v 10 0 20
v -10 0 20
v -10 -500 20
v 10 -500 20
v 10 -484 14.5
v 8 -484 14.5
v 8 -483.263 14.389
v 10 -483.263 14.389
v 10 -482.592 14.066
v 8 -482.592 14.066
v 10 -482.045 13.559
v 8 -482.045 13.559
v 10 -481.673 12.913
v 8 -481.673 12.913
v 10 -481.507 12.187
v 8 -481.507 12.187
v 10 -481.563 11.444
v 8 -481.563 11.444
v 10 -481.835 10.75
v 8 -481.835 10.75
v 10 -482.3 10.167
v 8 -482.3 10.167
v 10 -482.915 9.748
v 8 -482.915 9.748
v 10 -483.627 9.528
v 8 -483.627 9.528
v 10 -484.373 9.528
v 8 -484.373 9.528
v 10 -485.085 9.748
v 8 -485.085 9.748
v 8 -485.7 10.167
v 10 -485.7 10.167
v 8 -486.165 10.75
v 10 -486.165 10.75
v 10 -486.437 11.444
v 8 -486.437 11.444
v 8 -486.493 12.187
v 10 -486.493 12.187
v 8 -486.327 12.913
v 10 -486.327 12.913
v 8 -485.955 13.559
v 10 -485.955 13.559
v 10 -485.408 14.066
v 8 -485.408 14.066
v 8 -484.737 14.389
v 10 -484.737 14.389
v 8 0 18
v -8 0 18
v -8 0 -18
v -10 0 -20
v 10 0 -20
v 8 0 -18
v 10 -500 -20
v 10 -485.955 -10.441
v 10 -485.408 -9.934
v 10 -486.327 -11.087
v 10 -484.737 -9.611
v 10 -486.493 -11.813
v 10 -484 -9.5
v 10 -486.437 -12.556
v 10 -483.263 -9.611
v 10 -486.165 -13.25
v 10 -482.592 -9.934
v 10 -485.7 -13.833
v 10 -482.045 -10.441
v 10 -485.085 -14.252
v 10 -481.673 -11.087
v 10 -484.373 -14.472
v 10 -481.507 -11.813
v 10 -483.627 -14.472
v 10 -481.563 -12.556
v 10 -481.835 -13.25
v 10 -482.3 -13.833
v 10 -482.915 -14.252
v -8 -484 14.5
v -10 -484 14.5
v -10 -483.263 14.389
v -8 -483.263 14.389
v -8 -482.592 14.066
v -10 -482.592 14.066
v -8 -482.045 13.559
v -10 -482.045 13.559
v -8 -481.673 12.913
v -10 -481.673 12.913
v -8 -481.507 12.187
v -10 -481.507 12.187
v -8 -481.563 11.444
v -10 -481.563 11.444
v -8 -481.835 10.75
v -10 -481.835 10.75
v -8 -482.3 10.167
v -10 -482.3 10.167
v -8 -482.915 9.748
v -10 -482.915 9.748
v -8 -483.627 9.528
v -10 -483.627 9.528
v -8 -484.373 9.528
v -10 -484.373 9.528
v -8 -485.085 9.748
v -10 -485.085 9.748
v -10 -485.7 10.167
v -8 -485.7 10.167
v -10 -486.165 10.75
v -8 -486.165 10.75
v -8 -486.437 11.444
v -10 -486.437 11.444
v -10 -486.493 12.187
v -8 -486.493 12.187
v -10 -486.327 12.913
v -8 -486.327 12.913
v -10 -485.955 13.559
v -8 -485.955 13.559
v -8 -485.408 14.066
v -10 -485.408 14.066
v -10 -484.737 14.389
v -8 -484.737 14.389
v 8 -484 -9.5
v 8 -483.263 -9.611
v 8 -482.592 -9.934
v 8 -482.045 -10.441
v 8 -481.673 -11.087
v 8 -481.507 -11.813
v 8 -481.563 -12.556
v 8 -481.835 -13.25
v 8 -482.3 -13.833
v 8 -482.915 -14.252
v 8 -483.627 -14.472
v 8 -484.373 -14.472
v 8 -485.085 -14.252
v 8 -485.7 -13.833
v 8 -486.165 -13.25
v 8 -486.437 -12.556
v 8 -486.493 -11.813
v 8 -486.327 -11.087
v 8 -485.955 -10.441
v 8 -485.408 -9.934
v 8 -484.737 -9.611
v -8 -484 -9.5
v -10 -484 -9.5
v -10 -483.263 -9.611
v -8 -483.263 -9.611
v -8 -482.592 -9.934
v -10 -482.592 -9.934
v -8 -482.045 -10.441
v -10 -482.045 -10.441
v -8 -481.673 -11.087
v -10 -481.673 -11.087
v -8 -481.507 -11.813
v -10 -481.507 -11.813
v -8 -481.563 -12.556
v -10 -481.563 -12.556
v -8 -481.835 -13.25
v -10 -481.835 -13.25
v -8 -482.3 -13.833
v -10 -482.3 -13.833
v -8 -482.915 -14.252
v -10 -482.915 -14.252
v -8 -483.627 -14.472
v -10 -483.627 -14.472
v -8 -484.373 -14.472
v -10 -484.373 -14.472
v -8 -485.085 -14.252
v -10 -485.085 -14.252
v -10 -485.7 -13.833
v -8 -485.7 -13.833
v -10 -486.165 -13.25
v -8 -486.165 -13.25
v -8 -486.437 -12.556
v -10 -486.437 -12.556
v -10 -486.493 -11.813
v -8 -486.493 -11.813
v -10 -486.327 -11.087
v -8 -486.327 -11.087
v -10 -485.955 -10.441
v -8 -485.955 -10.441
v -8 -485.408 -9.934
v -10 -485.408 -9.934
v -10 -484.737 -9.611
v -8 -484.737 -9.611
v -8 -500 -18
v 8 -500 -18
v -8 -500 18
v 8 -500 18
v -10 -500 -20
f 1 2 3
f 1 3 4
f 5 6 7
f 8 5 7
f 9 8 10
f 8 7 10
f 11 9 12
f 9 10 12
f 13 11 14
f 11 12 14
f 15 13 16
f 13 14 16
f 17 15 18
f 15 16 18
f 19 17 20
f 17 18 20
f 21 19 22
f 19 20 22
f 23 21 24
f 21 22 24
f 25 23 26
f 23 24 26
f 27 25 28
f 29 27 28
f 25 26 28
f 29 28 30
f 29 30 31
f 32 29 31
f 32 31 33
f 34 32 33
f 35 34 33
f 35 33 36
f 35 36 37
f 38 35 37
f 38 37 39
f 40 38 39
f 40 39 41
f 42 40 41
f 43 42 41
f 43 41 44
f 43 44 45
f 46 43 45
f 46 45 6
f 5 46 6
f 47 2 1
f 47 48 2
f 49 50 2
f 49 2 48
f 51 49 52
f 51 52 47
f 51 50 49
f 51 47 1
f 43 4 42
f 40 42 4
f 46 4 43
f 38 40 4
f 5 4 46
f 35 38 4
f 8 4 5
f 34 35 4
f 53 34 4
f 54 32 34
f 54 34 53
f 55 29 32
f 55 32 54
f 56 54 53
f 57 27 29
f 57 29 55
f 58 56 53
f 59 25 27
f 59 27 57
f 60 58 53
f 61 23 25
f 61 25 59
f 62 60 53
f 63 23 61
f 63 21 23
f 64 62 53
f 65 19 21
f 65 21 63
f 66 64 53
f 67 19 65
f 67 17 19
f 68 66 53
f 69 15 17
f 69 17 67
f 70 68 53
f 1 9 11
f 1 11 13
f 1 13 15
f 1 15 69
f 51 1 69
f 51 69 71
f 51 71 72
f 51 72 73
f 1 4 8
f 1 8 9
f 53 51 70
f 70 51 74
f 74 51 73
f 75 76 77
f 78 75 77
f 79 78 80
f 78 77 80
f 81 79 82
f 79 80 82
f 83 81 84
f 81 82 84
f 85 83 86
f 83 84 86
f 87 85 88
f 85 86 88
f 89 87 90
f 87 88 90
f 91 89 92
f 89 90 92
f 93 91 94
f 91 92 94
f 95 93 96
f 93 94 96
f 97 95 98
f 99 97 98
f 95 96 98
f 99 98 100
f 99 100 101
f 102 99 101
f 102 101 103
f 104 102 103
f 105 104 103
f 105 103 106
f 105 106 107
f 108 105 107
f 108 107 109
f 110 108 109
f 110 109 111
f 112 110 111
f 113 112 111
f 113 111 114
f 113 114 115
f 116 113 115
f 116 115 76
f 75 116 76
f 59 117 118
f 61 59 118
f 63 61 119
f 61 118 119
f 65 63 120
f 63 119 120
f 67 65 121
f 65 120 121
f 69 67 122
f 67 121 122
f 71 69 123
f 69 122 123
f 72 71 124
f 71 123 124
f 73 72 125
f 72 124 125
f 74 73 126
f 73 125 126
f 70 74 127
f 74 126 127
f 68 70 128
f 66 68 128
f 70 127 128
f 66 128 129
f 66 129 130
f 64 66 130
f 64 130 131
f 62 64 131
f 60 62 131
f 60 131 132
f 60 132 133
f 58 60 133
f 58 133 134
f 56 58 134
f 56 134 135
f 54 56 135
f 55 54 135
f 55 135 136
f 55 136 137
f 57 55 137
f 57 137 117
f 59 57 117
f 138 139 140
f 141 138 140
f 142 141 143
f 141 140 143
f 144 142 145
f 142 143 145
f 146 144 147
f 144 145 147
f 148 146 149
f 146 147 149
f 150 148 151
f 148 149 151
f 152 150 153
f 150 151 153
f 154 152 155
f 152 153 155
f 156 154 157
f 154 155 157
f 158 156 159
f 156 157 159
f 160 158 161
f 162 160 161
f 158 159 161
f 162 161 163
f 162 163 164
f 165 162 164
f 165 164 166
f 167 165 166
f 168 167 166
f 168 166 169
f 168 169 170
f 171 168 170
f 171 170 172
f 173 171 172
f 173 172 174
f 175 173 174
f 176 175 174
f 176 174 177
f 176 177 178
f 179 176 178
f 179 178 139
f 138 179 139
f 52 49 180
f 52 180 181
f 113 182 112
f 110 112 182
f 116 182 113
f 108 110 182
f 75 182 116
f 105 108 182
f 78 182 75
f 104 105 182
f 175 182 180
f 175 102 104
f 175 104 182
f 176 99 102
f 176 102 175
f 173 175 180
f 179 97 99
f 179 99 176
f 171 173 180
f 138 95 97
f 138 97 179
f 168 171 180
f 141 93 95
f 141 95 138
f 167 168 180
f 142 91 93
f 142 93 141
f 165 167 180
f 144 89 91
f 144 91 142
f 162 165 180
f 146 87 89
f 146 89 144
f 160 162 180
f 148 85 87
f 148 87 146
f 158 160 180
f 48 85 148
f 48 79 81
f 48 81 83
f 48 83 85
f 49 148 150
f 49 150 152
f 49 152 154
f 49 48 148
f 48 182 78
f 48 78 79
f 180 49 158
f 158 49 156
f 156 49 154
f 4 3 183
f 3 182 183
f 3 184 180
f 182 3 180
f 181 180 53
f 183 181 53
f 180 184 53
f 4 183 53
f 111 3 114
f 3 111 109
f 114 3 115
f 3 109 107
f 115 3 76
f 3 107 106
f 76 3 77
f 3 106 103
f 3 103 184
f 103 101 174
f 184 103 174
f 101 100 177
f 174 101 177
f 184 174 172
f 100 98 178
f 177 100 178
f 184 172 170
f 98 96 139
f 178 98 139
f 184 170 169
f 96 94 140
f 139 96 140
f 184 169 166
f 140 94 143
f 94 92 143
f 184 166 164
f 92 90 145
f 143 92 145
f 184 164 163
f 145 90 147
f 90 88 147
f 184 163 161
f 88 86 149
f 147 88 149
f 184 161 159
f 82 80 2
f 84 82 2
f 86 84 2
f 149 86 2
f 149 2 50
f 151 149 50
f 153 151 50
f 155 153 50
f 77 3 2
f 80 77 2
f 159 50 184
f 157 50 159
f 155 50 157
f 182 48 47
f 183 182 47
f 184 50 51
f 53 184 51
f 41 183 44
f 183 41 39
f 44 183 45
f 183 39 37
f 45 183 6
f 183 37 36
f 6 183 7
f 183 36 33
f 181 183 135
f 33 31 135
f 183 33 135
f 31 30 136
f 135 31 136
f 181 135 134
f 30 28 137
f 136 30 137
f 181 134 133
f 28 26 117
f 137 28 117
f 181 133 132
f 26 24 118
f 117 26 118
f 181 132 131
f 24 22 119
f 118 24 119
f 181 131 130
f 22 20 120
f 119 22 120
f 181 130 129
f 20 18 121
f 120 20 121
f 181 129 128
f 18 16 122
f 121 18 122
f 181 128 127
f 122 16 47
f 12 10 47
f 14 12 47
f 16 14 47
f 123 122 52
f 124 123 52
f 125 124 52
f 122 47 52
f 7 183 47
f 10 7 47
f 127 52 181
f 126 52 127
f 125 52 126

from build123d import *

# Parameters (mm, degrees)
SKETCH3_W                   = 20
SKETCH3_H                   = 40
SKETCH3_W_2                 = 16
SKETCH3_H_2                 = 36
BASE_FLANGE1_DEPTH          = 500
TAP_DRILL_FOR_M6X1_0_TAP1_D = 5


# Sheet-metal steps are written as plain solids
with BuildPart() as part:
    # Sketch3 → Base-Flange1 (new body)
    with BuildSketch(Plane(origin=(0, 0, 0), x_dir=(1, 0, 0), z_dir=(0, 1, 0))):
        Rectangle(SKETCH3_W, SKETCH3_H)
        Rectangle(SKETCH3_W_2, SKETCH3_H_2, mode=Mode.SUBTRACT)
    extrude(amount=-BASE_FLANGE1_DEPTH)

    # Tap Drill for M6x1.0 Tap1 (through all)
    with Locations(Plane(origin=(10, 0, 0), x_dir=(0, 0, -1), z_dir=(1, 0, 0))):
        with Locations((-12, -484), (12, -484)):
            Hole(TAP_DRILL_FOR_M6X1_0_TAP1_D / 2)


solid = part.part
